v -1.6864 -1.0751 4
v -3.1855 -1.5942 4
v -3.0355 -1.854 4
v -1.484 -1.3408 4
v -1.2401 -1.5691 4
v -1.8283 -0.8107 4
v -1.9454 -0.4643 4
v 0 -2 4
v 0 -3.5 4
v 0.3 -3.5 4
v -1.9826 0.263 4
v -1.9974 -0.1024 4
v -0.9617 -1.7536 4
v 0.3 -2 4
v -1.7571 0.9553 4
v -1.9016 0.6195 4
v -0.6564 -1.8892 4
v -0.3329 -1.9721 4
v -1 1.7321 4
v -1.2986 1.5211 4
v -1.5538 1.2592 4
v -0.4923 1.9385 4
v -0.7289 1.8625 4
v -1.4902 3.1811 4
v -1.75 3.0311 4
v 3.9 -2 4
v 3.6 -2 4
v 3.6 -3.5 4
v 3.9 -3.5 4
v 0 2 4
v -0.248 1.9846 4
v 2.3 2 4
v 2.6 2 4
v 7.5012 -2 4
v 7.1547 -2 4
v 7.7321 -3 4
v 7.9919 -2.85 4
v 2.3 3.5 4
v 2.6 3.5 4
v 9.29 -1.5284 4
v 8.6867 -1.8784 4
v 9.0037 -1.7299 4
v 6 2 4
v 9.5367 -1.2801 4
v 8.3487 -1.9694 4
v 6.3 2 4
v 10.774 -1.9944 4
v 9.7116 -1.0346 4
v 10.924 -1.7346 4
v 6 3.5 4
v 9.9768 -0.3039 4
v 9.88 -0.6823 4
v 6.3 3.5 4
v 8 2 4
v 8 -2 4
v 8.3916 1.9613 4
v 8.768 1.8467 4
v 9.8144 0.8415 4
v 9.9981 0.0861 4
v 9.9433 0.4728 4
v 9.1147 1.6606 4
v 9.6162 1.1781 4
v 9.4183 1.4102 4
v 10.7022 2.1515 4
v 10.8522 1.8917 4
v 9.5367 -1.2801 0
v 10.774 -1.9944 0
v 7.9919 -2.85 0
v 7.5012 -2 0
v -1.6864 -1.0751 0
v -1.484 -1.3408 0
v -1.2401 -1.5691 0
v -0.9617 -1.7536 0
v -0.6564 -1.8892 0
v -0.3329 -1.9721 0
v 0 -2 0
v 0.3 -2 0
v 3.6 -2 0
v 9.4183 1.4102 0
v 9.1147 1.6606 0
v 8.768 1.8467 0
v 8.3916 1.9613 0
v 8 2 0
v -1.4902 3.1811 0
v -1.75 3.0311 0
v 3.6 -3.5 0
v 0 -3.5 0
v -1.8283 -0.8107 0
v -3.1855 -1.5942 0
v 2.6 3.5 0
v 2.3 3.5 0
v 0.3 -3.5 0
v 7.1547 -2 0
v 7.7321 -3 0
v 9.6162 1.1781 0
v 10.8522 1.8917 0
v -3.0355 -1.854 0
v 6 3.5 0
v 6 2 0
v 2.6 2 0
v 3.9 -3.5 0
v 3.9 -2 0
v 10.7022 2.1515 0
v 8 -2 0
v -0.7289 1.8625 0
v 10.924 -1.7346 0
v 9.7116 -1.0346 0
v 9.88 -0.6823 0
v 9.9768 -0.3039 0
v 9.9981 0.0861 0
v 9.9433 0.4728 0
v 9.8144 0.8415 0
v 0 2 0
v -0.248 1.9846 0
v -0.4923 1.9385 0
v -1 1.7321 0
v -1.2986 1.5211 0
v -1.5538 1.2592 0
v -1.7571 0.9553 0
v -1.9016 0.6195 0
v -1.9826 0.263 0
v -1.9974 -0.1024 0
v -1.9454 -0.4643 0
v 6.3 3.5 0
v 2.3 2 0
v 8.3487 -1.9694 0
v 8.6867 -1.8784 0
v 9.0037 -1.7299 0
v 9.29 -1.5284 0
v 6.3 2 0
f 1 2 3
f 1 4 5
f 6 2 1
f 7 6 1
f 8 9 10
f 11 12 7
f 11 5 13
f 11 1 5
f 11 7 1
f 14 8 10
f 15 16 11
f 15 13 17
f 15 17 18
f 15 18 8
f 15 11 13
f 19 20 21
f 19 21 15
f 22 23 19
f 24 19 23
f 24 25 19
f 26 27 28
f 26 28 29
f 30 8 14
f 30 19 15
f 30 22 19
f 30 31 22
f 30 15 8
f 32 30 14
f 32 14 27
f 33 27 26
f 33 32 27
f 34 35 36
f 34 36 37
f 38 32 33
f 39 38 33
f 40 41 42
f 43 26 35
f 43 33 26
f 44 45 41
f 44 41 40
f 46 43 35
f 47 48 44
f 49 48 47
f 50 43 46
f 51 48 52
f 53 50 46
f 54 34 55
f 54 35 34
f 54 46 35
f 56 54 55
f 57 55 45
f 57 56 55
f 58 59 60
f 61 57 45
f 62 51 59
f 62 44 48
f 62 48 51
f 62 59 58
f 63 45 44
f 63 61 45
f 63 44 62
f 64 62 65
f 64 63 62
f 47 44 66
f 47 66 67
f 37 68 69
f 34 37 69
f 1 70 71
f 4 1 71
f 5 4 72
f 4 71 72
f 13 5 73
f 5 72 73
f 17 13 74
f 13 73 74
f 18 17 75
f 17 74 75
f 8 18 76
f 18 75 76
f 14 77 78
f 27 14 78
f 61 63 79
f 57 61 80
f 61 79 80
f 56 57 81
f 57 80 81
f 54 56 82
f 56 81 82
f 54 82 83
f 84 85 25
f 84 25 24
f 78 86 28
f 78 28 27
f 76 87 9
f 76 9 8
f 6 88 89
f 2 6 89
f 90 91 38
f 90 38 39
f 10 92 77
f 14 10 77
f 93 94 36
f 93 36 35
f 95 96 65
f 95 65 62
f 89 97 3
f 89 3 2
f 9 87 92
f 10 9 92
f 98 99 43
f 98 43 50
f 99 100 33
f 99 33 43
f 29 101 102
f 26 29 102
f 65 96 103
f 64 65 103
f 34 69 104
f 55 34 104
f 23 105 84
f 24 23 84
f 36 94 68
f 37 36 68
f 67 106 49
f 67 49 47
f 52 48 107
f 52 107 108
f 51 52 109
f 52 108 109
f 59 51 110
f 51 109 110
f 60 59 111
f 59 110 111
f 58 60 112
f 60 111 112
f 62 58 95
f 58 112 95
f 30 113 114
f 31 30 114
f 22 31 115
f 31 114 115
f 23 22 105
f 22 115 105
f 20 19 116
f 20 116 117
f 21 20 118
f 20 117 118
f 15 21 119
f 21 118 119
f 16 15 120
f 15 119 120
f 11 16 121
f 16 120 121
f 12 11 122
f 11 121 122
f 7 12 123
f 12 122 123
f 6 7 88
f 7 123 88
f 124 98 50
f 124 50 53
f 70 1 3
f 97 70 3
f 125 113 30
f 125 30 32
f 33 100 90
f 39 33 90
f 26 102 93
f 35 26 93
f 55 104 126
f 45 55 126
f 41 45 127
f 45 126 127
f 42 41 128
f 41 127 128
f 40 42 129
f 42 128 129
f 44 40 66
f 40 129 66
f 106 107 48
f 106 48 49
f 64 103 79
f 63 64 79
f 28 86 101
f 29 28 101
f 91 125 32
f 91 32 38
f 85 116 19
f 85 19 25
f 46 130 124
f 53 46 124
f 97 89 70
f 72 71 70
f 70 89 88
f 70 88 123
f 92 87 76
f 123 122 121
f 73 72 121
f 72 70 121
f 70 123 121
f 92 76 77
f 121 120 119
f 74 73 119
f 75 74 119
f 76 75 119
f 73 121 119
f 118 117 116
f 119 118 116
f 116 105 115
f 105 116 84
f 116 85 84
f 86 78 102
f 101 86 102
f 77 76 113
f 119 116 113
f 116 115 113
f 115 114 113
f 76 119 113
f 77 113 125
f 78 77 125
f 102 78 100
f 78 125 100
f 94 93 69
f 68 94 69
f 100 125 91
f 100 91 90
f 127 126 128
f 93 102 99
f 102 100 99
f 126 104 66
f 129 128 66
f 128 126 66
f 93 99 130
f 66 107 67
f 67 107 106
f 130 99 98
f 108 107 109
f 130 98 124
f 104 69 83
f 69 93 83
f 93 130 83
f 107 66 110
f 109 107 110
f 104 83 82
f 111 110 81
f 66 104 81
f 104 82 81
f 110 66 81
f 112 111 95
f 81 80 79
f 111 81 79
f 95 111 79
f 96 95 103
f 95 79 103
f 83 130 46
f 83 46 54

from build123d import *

# Parameters (mm, degrees)
BOX018_W               = 0.3
BOX018_H               = 3.5
BOX018_DEPTH           = 4
BOX018_PLACEMENT_ANGLE = 120
BOX017_W               = 0.3
BOX017_H               = 3.5
BOX017_DEPTH           = 4
BOX017_PLACEMENT_ANGLE = 120
BOX016_W               = 0.3
BOX016_H               = 3.5
BOX016_DEPTH           = 4
BOX016_PLACEMENT_ANGLE = 120
BOX014_W               = 0.3
BOX014_H               = 3.5
BOX014_DEPTH           = 4
BOX003_W               = 0.3
BOX003_H               = 3.5
BOX003_DEPTH           = 4
BOX003_PLACEMENT_ANGLE = 30
BOX001_W               = 0.3
BOX001_H               = 3.5
BOX001_DEPTH           = 4
BOX001_PLACEMENT_ANGLE = 30
BOX002_W               = 0.3
BOX002_H               = 3.5
BOX002_DEPTH           = 4
BOX015_W               = 0.3
BOX015_H               = 3.5
BOX015_DEPTH           = 4
BOX004_W               = 0.3
BOX004_H               = 3.5
BOX004_DEPTH           = 4
BOX_W                  = 8
BOX_H                  = 4
BOX_DEPTH              = 4
CYLINDER001_R          = 2
CYLINDER001_DEPTH      = 4
CYLINDER_R             = 2
CYLINDER_DEPTH         = 4


with BuildPart() as cube018:
    # Box018 → Box018 (new body)
    with BuildSketch(Plane.XY):
        with Locations((0.15, 1.75)):
            Rectangle(BOX018_W, BOX018_H)
    extrude(amount=BOX018_DEPTH)


with BuildPart() as cube018_1:
    # Box018 placement: moved
    add(cube018.part.moved(Location((7.892915, 0.015358, 0))).rotate(Axis((7.892915, 0.015358, 0), (0, 0, -1)), BOX018_PLACEMENT_ANGLE))


with BuildPart() as cube017:
    # Box017 → Box017 (new body)
    with BuildSketch(Plane.XY):
        with Locations((0.15, 1.75)):
            Rectangle(BOX017_W, BOX017_H)
    extrude(amount=BOX017_DEPTH)


with BuildPart() as cube017_1:
    # Box017 placement: moved
    add(cube017.part.moved(Location((10.852236, 1.891667, 0))).rotate(Axis((10.852236, 1.891667, 0), (0, 0, 1)), BOX017_PLACEMENT_ANGLE))


with BuildPart() as cube016:
    # Box016 → Box016 (new body)
    with BuildSketch(Plane.XY):
        with Locations((0.15, 1.75)):
            Rectangle(BOX016_W, BOX016_H)
    extrude(amount=BOX016_DEPTH)


with BuildPart() as cube016_1:
    # Box016 placement: moved
    add(cube016.part.moved(Location((-0.004428, -0.104039, 0))).rotate(Axis((-0.004428, -0.104039, 0), (0, 0, 1)), BOX016_PLACEMENT_ANGLE))


with BuildPart() as cube014:
    # Box014 → Box014 (new body)
    with BuildSketch(Plane(origin=(2.3, 0, 0), x_dir=(1, 0, 0), z_dir=(0, 0, 1))):
        with Locations((0.15, 1.75)):
            Rectangle(BOX014_W, BOX014_H)
    extrude(amount=BOX014_DEPTH)


with BuildPart() as cube003:
    # Box003 → Box003 (new body)
    with BuildSketch(Plane.XY):
        with Locations((0.15, 1.75)):
            Rectangle(BOX003_W, BOX003_H)
    extrude(amount=BOX003_DEPTH)


with BuildPart() as cube003_1:
    # Box003 placement: moved
    add(cube003.part.moved(Location((7.7321, -3, 0))).rotate(Axis((7.7321, -3, 0), (0, 0, 1)), BOX003_PLACEMENT_ANGLE))


with BuildPart() as cube001:
    # Box001 → Box001 (new body)
    with BuildSketch(Plane.XY):
        with Locations((0.15, 1.75)):
            Rectangle(BOX001_W, BOX001_H)
    extrude(amount=BOX001_DEPTH)


with BuildPart() as cube001_1:
    # Box001 placement: moved
    add(cube001.part.rotate(Axis((0, 0, 0), (0, 0, 1)), BOX001_PLACEMENT_ANGLE))


with BuildPart() as cube002:
    # Box002 → Box002 (new body)
    with BuildSketch(Plane(origin=(6, 0, 0), x_dir=(1, 0, 0), z_dir=(0, 0, 1))):
        with Locations((0.15, 1.75)):
            Rectangle(BOX002_W, BOX002_H)
    extrude(amount=BOX002_DEPTH)


with BuildPart() as cube015:
    # Box015 → Box015 (new body)
    with BuildSketch(Plane(origin=(3.6, -3.5, 0), x_dir=(1, 0, 0), z_dir=(0, 0, 1))):
        with Locations((0.15, 1.75)):
            Rectangle(BOX015_W, BOX015_H)
    extrude(amount=BOX015_DEPTH)


with BuildPart() as fusion008:
    # Box004 → Box004 (new body)
    with BuildSketch(Plane(origin=(0, -3.5, 0), x_dir=(1, 0, 0), z_dir=(0, 0, 1))):
        with Locations((0.15, 1.75)):
            Rectangle(BOX004_W, BOX004_H)
    extrude(amount=BOX004_DEPTH)

    # Fusion008: union Cube018, Cube017, Cube016, Cube014, Cube003, Cube001, Cube002, Cube015
    add(cube018_1.part)
    add(cube017_1.part)
    add(cube016_1.part)
    add(cube014.part)
    add(cube003_1.part)
    add(cube001_1.part)
    add(cube002.part)
    add(cube015.part)


with BuildPart() as cube:
    # Box → Box (new body)
    with BuildSketch(Plane(origin=(0, -2, 0), x_dir=(1, 0, 0), z_dir=(0, 0, 1))):
        with Locations((4, 2)):
            Rectangle(BOX_W, BOX_H)
    extrude(amount=BOX_DEPTH)


with BuildPart() as cylinder001:
    # Cylinder001 → Cylinder001 (new body)
    with BuildSketch(Plane(origin=(8, 0, 0), x_dir=(1, 0, 0), z_dir=(0, 0, 1))):
        Circle(CYLINDER001_R)
    extrude(amount=CYLINDER001_DEPTH)


with BuildPart() as fusion014:
    # Cylinder → Cylinder (new body)
    with BuildSketch(Plane.XY):
        Circle(CYLINDER_R)
    extrude(amount=CYLINDER_DEPTH)

    # Fusion: union Cube, Cylinder001
    add(cube.part)
    add(cylinder001.part)

    # Fusion014: union Fusion008
    add(fusion008.part)


solid = fusion014.part
